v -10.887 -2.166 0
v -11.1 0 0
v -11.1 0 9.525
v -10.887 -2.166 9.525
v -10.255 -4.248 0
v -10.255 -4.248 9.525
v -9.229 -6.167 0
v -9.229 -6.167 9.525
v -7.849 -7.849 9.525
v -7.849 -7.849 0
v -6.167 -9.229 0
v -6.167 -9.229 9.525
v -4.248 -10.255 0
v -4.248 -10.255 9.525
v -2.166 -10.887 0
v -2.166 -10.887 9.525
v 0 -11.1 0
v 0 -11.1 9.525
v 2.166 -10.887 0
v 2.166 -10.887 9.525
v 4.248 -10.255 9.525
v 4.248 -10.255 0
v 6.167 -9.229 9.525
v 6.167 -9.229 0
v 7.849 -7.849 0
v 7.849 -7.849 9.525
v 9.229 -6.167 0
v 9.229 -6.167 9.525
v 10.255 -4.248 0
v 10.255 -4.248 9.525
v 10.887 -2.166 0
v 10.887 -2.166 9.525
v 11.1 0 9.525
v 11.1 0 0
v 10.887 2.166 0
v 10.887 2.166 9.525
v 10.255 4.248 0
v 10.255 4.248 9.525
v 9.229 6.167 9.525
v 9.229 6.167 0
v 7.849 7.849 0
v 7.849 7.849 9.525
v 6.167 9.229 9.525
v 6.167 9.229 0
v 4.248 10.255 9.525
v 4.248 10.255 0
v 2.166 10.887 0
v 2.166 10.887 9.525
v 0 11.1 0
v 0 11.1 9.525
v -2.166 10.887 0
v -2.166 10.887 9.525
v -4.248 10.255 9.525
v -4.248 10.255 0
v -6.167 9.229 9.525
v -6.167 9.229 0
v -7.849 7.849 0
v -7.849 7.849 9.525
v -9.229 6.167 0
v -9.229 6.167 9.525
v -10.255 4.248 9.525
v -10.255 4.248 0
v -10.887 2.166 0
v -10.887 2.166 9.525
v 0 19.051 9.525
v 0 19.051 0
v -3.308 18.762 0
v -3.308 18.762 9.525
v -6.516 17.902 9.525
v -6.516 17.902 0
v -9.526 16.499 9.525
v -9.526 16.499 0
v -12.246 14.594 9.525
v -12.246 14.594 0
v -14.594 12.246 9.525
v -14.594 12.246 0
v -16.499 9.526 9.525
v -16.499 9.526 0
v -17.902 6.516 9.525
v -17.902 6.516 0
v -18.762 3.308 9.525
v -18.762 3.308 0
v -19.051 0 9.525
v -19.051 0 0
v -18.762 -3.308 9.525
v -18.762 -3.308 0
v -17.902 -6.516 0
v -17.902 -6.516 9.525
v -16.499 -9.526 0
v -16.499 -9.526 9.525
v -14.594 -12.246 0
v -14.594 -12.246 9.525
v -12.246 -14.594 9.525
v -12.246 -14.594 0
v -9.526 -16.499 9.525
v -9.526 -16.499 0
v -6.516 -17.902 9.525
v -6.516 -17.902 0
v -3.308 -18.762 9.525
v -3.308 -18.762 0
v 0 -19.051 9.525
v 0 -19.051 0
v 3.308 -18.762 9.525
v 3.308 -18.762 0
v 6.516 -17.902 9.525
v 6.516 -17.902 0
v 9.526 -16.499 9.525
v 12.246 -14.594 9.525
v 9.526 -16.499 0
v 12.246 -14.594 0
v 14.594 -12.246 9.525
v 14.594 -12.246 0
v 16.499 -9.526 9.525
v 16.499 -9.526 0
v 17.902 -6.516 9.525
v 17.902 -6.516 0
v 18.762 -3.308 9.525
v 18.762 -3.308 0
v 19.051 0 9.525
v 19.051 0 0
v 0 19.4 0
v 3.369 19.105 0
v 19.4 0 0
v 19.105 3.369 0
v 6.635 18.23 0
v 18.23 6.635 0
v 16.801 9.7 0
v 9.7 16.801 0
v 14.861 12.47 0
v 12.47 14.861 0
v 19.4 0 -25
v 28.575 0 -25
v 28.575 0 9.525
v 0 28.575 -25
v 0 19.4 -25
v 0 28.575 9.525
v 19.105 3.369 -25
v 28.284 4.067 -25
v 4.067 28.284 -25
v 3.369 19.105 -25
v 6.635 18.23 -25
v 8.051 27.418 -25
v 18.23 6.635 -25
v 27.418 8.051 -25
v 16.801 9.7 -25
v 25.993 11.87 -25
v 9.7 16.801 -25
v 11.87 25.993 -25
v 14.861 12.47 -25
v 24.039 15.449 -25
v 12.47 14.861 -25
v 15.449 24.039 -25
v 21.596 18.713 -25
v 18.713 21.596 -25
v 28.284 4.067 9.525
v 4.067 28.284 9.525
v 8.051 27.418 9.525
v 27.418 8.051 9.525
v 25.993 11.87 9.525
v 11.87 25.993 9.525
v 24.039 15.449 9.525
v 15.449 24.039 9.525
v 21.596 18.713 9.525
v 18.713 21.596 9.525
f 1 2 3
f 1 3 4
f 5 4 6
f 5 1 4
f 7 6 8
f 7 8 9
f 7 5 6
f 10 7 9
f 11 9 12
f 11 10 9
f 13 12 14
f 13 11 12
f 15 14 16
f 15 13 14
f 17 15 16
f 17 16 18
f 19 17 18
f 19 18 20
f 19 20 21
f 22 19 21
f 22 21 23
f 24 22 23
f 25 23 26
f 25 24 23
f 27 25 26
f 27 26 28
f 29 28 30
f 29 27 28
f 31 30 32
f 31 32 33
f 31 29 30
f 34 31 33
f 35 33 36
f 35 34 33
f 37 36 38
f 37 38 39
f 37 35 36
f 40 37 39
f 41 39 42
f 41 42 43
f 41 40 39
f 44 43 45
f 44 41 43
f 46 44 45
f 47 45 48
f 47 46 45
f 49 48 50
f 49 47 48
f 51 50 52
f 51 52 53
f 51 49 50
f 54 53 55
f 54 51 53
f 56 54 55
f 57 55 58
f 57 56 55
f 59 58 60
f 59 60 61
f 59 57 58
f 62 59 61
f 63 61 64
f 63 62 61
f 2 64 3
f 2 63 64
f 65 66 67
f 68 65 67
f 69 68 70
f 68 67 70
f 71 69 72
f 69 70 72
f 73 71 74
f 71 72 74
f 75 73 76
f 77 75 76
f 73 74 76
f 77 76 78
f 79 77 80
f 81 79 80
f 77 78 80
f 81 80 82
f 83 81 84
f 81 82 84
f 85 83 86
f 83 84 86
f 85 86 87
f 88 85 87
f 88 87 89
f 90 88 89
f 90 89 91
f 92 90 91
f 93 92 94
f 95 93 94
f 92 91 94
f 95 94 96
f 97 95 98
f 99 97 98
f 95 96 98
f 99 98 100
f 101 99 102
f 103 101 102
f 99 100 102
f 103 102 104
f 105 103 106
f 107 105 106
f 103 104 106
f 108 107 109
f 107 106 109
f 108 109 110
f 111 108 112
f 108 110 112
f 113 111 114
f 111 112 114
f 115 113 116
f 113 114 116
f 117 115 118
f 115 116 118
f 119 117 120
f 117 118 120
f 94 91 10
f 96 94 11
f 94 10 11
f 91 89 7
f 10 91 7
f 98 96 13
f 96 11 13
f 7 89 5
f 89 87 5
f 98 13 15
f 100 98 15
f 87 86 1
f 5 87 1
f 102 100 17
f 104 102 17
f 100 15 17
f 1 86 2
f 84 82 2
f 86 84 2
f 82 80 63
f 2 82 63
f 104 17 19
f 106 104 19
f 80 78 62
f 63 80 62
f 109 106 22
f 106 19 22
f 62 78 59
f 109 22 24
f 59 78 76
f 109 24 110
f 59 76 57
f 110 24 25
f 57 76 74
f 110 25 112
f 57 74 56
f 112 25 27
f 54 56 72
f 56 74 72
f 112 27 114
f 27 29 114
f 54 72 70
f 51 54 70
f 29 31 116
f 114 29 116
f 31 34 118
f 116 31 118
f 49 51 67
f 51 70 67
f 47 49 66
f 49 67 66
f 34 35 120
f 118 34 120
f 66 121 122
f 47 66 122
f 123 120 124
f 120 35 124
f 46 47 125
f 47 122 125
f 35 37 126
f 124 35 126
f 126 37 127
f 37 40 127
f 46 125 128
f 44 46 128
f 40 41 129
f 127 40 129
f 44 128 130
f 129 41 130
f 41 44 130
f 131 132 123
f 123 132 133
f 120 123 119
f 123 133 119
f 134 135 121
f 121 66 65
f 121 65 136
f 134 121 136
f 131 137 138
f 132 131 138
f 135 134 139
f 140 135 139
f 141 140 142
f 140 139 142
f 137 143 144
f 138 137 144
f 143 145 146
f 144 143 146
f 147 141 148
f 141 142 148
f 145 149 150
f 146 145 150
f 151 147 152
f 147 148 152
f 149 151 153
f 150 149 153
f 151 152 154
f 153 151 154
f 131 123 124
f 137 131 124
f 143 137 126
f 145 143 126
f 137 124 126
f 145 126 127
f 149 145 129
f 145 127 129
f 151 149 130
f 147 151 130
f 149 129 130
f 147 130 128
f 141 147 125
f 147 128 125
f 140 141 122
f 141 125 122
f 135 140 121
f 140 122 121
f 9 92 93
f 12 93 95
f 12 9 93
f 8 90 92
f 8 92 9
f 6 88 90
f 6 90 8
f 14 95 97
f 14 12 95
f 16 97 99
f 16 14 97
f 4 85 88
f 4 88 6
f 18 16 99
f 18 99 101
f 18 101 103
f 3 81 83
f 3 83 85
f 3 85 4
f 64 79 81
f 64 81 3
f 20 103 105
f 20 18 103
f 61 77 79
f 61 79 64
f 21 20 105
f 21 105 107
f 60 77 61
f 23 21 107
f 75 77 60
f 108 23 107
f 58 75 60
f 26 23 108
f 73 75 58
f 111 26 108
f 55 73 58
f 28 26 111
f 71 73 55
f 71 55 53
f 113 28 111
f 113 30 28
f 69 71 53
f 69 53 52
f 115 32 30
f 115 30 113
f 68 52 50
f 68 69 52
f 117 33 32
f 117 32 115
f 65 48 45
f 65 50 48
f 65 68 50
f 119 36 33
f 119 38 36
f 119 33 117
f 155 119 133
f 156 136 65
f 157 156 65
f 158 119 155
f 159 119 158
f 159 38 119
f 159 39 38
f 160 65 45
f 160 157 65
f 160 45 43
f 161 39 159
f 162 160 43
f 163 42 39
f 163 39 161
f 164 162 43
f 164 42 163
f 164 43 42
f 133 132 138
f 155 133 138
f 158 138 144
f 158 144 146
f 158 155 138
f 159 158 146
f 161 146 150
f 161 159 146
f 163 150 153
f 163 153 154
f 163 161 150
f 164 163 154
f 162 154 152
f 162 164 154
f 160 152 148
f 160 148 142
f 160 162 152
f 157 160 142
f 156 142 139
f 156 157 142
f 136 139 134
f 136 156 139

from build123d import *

# Parameters (mm, degrees)
SKETCH1_R           = 11.1
BOSS_EXTRUDE5_DEPTH = 9.525
BOSS_EXTRUDE6_DEPTH = 25


with BuildPart() as part:
    # Sketch1 → Boss-Extrude5 (new body)
    with BuildSketch(Plane.XY):
        with BuildLine():
            ThreePointArc((0, 19.051378432), (-13.47135888, -13.47135888), (19.051378432, 0))
            Line((19.051378432, 0), (28.575, 0))
            ThreePointArc((28.575, 0), (20.205576272, 20.205576272), (0, 28.575))
            Line((0, 28.575), (0, 19.051378432))
        make_face()
        with Locations(Location((0, 0, 0), (0, 0, 180))):
            Circle(SKETCH1_R, mode=Mode.SUBTRACT)
    extrude(amount=BOSS_EXTRUDE5_DEPTH)

    # Sketch2 → Boss-Extrude6 (add)
    with BuildSketch(Plane(origin=(0, 0, 0), x_dir=(-1, 0, 0), z_dir=(0, 0, -1))):
        with BuildLine():
            add(Edge.make_bspline(
                [(0, 28.575), (-21.908651484, 21.908651484), (-28.575, 0)],
                knots=[0, 0, 0, 1, 1, 1], degree=2))
            ThreePointArc((-28.575, 0), (-20.205576272, 20.205576272), (0, 28.575))
        make_face()
        with BuildLine():
            Line((0, 19.4), (0, 28.575))
            add(Edge.make_bspline(
                [(0, 28.575), (-21.908651484, 21.908651484), (-28.575, 0)],
                knots=[0, 0, 0, 1, 1, 1], degree=2))
            Line((-28.575, 0), (-19.4, 0))
            ThreePointArc((-19.4, 0), (-13.717871555, 13.717871555), (0, 19.4))
        make_face()
    extrude(amount=BOSS_EXTRUDE6_DEPTH)


solid = part.part
